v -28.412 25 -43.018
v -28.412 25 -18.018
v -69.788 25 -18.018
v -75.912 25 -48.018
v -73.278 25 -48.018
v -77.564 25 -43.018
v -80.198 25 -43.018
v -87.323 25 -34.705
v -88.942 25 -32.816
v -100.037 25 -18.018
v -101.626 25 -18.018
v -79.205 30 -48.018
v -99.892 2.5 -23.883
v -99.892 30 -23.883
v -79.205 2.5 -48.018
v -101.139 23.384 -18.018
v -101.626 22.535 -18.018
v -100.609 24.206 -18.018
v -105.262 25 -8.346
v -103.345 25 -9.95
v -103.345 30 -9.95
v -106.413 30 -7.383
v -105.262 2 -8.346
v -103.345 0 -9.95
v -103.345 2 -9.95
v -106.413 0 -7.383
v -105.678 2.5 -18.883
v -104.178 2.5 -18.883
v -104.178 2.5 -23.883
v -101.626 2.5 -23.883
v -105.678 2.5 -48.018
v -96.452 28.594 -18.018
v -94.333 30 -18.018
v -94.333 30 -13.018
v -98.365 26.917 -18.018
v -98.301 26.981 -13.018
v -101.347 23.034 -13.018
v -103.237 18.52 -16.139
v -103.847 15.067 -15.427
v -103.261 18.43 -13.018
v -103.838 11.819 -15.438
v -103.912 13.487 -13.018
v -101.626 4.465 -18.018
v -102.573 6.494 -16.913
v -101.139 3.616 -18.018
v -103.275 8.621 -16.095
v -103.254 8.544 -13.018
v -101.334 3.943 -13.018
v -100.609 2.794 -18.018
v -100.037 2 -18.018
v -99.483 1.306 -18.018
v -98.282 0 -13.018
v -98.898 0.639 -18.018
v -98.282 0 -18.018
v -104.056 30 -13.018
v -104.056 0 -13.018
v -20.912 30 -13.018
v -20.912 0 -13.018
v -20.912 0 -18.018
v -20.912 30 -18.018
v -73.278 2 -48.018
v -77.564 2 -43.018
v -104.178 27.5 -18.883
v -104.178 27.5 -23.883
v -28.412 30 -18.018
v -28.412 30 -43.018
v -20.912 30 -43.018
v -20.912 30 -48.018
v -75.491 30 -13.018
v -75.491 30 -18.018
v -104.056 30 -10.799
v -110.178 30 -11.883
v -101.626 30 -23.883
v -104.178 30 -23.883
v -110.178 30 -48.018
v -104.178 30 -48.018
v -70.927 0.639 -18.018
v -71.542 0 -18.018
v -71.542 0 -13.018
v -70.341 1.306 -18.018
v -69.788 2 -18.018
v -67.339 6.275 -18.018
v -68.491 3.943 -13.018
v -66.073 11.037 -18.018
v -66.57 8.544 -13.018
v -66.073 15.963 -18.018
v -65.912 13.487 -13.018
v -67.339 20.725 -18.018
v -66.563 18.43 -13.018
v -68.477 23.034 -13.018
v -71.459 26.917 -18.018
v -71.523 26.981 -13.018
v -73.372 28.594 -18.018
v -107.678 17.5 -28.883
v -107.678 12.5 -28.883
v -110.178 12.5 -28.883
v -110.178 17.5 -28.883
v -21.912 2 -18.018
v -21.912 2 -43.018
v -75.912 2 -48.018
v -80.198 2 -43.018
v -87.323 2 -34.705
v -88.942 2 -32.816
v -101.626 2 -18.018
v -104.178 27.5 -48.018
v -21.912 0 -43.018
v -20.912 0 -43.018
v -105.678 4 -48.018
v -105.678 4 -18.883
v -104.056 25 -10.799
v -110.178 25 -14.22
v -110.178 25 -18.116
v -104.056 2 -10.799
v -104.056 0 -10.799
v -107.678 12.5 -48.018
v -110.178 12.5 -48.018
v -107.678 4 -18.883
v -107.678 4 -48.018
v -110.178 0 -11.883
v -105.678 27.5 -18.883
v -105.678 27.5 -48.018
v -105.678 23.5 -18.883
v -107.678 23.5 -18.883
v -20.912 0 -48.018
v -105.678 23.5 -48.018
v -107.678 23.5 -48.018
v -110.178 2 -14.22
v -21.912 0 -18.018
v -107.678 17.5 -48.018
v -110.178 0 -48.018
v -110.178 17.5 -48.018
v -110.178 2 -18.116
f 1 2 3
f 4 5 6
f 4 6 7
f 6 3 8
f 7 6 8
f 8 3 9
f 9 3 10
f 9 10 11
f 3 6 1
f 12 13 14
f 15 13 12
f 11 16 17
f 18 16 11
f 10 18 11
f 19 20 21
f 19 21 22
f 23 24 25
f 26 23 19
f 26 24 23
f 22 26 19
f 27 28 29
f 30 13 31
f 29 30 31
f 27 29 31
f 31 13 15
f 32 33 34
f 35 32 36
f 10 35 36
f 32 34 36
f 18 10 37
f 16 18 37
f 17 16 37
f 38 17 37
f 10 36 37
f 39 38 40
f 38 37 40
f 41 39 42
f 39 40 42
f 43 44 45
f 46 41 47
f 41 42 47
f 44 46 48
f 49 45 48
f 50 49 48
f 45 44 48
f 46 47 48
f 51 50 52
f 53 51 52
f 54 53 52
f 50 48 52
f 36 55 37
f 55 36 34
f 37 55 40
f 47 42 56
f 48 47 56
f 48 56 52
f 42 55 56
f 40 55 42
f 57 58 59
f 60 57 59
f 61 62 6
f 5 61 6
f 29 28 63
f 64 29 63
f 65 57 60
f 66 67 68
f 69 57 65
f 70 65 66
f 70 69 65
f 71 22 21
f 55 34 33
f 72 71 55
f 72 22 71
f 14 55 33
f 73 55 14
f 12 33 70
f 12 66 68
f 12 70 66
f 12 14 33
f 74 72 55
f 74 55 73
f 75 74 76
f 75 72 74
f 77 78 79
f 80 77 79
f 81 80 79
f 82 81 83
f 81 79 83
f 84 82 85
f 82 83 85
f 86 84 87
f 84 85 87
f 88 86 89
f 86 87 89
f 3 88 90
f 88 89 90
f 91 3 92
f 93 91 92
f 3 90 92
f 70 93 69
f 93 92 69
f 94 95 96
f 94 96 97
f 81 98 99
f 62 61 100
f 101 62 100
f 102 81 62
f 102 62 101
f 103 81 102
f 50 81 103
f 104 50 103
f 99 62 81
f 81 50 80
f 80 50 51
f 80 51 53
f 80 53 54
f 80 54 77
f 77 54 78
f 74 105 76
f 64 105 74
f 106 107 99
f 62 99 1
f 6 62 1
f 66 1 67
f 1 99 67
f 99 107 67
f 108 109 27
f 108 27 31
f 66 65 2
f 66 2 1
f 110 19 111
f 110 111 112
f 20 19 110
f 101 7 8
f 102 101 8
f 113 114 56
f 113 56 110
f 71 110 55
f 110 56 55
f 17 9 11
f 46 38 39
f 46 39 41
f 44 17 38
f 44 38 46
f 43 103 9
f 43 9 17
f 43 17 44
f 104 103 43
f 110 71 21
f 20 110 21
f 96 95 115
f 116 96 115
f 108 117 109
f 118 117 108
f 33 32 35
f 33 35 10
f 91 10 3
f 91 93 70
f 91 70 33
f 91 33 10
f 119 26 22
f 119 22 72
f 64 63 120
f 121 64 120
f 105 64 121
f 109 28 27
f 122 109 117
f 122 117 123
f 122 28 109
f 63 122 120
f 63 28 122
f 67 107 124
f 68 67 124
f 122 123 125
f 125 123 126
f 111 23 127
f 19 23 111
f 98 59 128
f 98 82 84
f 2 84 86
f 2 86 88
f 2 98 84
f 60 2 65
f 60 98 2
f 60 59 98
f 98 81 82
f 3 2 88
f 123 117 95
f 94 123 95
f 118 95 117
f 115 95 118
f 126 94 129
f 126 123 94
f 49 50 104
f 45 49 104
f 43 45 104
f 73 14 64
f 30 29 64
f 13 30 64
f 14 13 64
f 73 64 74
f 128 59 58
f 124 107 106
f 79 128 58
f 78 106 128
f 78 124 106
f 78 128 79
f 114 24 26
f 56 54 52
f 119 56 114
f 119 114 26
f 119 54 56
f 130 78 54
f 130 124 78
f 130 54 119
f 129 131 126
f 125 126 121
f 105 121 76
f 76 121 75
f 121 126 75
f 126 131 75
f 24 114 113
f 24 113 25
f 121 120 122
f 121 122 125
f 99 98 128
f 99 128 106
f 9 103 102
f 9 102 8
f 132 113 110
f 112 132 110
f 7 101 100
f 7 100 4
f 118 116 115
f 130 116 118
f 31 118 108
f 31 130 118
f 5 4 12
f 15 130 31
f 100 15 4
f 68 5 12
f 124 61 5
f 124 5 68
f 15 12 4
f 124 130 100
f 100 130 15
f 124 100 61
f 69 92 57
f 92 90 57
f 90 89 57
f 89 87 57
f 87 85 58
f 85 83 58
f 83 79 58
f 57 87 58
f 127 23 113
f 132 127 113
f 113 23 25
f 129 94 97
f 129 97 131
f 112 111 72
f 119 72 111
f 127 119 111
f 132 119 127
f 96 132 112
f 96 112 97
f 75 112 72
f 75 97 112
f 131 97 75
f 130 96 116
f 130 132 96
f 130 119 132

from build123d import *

# Parameters (mm, degrees)
BOSS_EXTRUDE3_DEPTH  = 30
SKETCH6_W            = 25
SKETCH6_H            = 23
CUT_EXTRUDE1_DEPTH   = 86
SKETCH7_W            = 25
SKETCH7_H            = 5
CUT_EXTRUDE2_DEPTH   = 7.5
SKETCH8_W            = 25
SKETCH8_H            = 2
CUT_EXTRUDE3_DEPTH   = 1
SKETCH9_R            = 19
CUT_EXTRUDE4_DEPTH   = 5
BOSS_EXTRUDE4_DEPTH  = 30
SKETCH10_W           = 1.856561782
SKETCH10_H           = 30
BOSS_EXTRUDE5_DEPTH  = 3
BOSS_EXTRUDE6_DEPTH  = 30
SKETCH11_W           = 2.5
SKETCH11_H           = 23
CUT_EXTRUDE5_DEPTH   = 34.579503854
SKETCH12_W           = 29.135235428
SKETCH12_H           = 25
CUT_EXTRUDE6_DEPTH   = 3.5
SKETCH13_W           = 19.135235428
SKETCH13_H           = 5
CUT_EXTRUDE7_DEPTH   = 3.5
SKETCH14_W           = 29.135235428
SKETCH14_H           = 4
BOSS_EXTRUDE7_DEPTH  = 2
SKETCH16_W           = 29.135235428
SKETCH16_H           = 1.5
BOSS_EXTRUDE8_DEPTH  = 2
SKETCH17_W           = 2.551467674
SKETCH17_H           = 30
BOSS_EXTRUDE9_DEPTH  = 5
BOSS_EXTRUDE10_REACH = 85.266
SKETCH18_W           = 29.135235428
SKETCH18_H           = 2.5
SKETCH19_W           = 2.48850009
SKETCH19_H           = 23
BOSS_EXTRUDE11_DEPTH = 2
CUT_EXTRUDE8_START   = -2.4885
SKETCH20_W           = 2
SKETCH20_H           = 23
CUT_EXTRUDE8_DEPTH   = 21.736568
BOSS_EXTRUDE12_REACH = 82.714
SKETCH21_W           = 2.023287715
SKETCH21_H           = 27.5


with BuildPart() as part:
    # Sketch2 → Boss-Extrude3 (new body)
    with BuildSketch(Plane(origin=(0, 0, 0), x_dir=(1, 0, 0), z_dir=(0, 1, 0))):
        Polygon((-105.912162162, 13.018018018), (-20.912162162, 13.018018018), (-20.912162162, 48.018018018), (-75.912162162, 48.018018018), align=None)
    extrude(amount=BOSS_EXTRUDE3_DEPTH)

    # Sketch6 → Cut-Extrude1 (cut, through all)
    with BuildSketch(Plane(origin=(-20.912162162, 0, 0), x_dir=(0, 0, -1), z_dir=(1, 0, 0))):
        with Locations((30.518018018, 13.5)):
            Rectangle(SKETCH6_W, SKETCH6_H)
    extrude(amount=-CUT_EXTRUDE1_DEPTH, mode=Mode.SUBTRACT)

    # Sketch7 → Cut-Extrude2 (cut)
    with BuildSketch(Plane(origin=(-20.912162162, 0, 0), x_dir=(0, 0, -1), z_dir=(1, 0, 0))):
        with Locations((30.518018018, 27.5)):
            Rectangle(SKETCH7_W, SKETCH7_H)
    extrude(amount=-CUT_EXTRUDE2_DEPTH, mode=Mode.SUBTRACT)

    # Sketch8 → Cut-Extrude3 (cut)
    with BuildSketch(Plane(origin=(-20.912162162, 0, 0), x_dir=(0, 0, -1), z_dir=(1, 0, 0))):
        with Locations((30.518018018, 1)):
            Rectangle(SKETCH8_W, SKETCH8_H)
    extrude(amount=-CUT_EXTRUDE3_DEPTH, mode=Mode.SUBTRACT)

    # Sketch9 → Cut-Extrude4 (cut)
    with BuildSketch(Plane.XY.offset(-13.018018018)):
        with Locations((-84.912162162, 13.5)):
            Circle(SKETCH9_R)
    extrude(amount=-CUT_EXTRUDE4_DEPTH, mode=Mode.SUBTRACT)

    # Sketch3 → Boss-Extrude4 (add)
    with BuildSketch(Plane(origin=(0, 0, 0), x_dir=(1, 0, 0), z_dir=(0, 1, 0))):
        Polygon((-106.412808957, 7.383361614), (-110.17791555, 11.88278259), (-79.204856611, 48.018018018), (-75.912162162, 48.018018018), (-105.912162162, 13.018018018), (-103.345157358, 9.950366419), align=None)
    extrude(amount=BOSS_EXTRUDE4_DEPTH)

    # Sketch10 → Boss-Extrude5 (add)
    with BuildSketch(Plane.XY.offset(-13.018018018)):
        with Locations((-104.983881271, 15)):
            Rectangle(SKETCH10_W, SKETCH10_H)
    extrude(amount=BOSS_EXTRUDE5_DEPTH)

    # Sketch4 → Boss-Extrude6 (add)
    with BuildSketch(Plane(origin=(0, 0, 0), x_dir=(1, 0, 0), z_dir=(0, 1, 0))):
        Polygon((-110.17791555, 11.88278259), (-110.17791555, 48.018018018), (-104.17791555, 48.018018018), (-104.17791555, 18.88278259), align=None)
    extrude(amount=BOSS_EXTRUDE6_DEPTH)

    # Sketch11 → Cut-Extrude5 (cut, through all)
    with BuildSketch(Plane(origin=(-47.459390138, 0, -56.715466139), x_dir=(0.7669129, 0, -0.641751201), z_dir=(0.641751201, 0, 0.7669129))):
        with Locations((-74.121074711, 13.5)):
            Rectangle(SKETCH11_W, SKETCH11_H)
    extrude(amount=-CUT_EXTRUDE5_DEPTH, mode=Mode.SUBTRACT)

    # Sketch12 → Cut-Extrude6 (cut)
    with BuildSketch(Plane(origin=(-104.17791555, 0, 0), x_dir=(0, 0, -1), z_dir=(1, 0, 0))):
        with Locations((33.450400304, 15)):
            Rectangle(SKETCH12_W, SKETCH12_H)
    extrude(amount=-CUT_EXTRUDE6_DEPTH, mode=Mode.SUBTRACT)

    # Sketch13 → Cut-Extrude7 (cut, through all)
    with BuildSketch(Plane(origin=(-107.67791555, 0, 0), x_dir=(0, 0, -1), z_dir=(1, 0, 0))):
        with Locations((38.450400304, 15)):
            Rectangle(SKETCH13_W, SKETCH13_H)
    extrude(amount=-CUT_EXTRUDE7_DEPTH, mode=Mode.SUBTRACT)

    # Sketch14 → Boss-Extrude7 (add)
    with BuildSketch(Plane(origin=(-107.67791555, 0, 0), x_dir=(0, 0, -1), z_dir=(1, 0, 0))):
        with Locations((33.450400304, 25.5)):
            Rectangle(SKETCH14_W, SKETCH14_H)
    extrude(amount=BOSS_EXTRUDE7_DEPTH)

    # Sketch16 → Boss-Extrude8 (add)
    with BuildSketch(Plane(origin=(-107.67791555, 0, 0), x_dir=(0, 0, -1), z_dir=(1, 0, 0))):
        with Locations((33.450400304, 3.25)):
            Rectangle(SKETCH16_W, SKETCH16_H)
    extrude(amount=BOSS_EXTRUDE8_DEPTH)

    # Sketch17 → Boss-Extrude9 (add)
    with BuildSketch(Plane(origin=(0, 0, -18.88278259), x_dir=(-1, 0, 0), z_dir=(0, 0, -1))):
        with Locations((102.902181713, 15)):
            Rectangle(SKETCH17_W, SKETCH17_H)
    extrude(amount=BOSS_EXTRUDE9_DEPTH)

    # Boss-Extrude10: up to this face of the body (flat: up to its plane)
    boss_extrude10_end = Plane(part.part.faces().sort_by_distance((-90.415652244, 15, -34.938756447))[0])
    # Sketch18 → Boss-Extrude10 (add, up to the picked face)
    with BuildSketch(Plane(origin=(-104.17791555, 0, 0), x_dir=(0, 0, -1), z_dir=(1, 0, 0)), mode=Mode.PRIVATE) as boss_extrude10_sk1:
        with Locations((33.450400304, 1.25)):
            Rectangle(SKETCH18_W, SKETCH18_H)
    boss_extrude10_tool1 = split(extrude(boss_extrude10_sk1.sketch, amount=BOSS_EXTRUDE10_REACH, mode=Mode.PRIVATE), bisect_by=boss_extrude10_end, keep=Keep.BOTH, mode=Mode.PRIVATE)
    add(boss_extrude10_tool1.solids().sort_by_distance((-104.177916, 1.25, -33.4504))[0])

    # Sketch19 → Boss-Extrude11 (add)
    with BuildSketch(Plane(origin=(-67.487678855, 0, -57.846581876), x_dir=(0.650791373, 0, -0.759256602), z_dir=(0.759256602, 0, 0.650791373))):
        with Locations((-31.723015124, 13.5)):
            Rectangle(SKETCH19_W, SKETCH19_H)
    extrude(amount=BOSS_EXTRUDE11_DEPTH)

    # Sketch20 → Cut-Extrude8 (cut)
    with BuildSketch(Plane(origin=(-19.835317387, 0, 23.141203618), x_dir=(-0.759256602, 0, -0.650791373), z_dir=(0.650791373, 0, -0.759256602)).offset(CUT_EXTRUDE8_START)):
        with Locations((87.886522218, 13.5)):
            Rectangle(SKETCH20_W, SKETCH20_H)
    extrude(amount=CUT_EXTRUDE8_DEPTH, mode=Mode.SUBTRACT)

    # Boss-Extrude12: up to this face of the body (flat: up to its plane)
    boss_extrude12_end = Plane(part.part.faces().sort_by_distance((-90.415652244, 16.25, -34.938756447))[0])
    # Sketch21 → Boss-Extrude12 (add, up to the picked face)
    with BuildSketch(Plane(origin=(-101.626447876, 0, 0), x_dir=(0, 0, -1), z_dir=(1, 0, 0)), mode=Mode.PRIVATE) as boss_extrude12_sk1:
        with Locations((22.871138733, 16.25)):
            Rectangle(SKETCH21_W, SKETCH21_H)
    boss_extrude12_tool1 = split(extrude(boss_extrude12_sk1.sketch, amount=BOSS_EXTRUDE12_REACH, mode=Mode.PRIVATE), bisect_by=boss_extrude12_end, keep=Keep.BOTH, mode=Mode.PRIVATE)
    add(boss_extrude12_tool1.solids().sort_by_distance((-101.626448, 16.25, -22.871139))[0])


solid = part.part
